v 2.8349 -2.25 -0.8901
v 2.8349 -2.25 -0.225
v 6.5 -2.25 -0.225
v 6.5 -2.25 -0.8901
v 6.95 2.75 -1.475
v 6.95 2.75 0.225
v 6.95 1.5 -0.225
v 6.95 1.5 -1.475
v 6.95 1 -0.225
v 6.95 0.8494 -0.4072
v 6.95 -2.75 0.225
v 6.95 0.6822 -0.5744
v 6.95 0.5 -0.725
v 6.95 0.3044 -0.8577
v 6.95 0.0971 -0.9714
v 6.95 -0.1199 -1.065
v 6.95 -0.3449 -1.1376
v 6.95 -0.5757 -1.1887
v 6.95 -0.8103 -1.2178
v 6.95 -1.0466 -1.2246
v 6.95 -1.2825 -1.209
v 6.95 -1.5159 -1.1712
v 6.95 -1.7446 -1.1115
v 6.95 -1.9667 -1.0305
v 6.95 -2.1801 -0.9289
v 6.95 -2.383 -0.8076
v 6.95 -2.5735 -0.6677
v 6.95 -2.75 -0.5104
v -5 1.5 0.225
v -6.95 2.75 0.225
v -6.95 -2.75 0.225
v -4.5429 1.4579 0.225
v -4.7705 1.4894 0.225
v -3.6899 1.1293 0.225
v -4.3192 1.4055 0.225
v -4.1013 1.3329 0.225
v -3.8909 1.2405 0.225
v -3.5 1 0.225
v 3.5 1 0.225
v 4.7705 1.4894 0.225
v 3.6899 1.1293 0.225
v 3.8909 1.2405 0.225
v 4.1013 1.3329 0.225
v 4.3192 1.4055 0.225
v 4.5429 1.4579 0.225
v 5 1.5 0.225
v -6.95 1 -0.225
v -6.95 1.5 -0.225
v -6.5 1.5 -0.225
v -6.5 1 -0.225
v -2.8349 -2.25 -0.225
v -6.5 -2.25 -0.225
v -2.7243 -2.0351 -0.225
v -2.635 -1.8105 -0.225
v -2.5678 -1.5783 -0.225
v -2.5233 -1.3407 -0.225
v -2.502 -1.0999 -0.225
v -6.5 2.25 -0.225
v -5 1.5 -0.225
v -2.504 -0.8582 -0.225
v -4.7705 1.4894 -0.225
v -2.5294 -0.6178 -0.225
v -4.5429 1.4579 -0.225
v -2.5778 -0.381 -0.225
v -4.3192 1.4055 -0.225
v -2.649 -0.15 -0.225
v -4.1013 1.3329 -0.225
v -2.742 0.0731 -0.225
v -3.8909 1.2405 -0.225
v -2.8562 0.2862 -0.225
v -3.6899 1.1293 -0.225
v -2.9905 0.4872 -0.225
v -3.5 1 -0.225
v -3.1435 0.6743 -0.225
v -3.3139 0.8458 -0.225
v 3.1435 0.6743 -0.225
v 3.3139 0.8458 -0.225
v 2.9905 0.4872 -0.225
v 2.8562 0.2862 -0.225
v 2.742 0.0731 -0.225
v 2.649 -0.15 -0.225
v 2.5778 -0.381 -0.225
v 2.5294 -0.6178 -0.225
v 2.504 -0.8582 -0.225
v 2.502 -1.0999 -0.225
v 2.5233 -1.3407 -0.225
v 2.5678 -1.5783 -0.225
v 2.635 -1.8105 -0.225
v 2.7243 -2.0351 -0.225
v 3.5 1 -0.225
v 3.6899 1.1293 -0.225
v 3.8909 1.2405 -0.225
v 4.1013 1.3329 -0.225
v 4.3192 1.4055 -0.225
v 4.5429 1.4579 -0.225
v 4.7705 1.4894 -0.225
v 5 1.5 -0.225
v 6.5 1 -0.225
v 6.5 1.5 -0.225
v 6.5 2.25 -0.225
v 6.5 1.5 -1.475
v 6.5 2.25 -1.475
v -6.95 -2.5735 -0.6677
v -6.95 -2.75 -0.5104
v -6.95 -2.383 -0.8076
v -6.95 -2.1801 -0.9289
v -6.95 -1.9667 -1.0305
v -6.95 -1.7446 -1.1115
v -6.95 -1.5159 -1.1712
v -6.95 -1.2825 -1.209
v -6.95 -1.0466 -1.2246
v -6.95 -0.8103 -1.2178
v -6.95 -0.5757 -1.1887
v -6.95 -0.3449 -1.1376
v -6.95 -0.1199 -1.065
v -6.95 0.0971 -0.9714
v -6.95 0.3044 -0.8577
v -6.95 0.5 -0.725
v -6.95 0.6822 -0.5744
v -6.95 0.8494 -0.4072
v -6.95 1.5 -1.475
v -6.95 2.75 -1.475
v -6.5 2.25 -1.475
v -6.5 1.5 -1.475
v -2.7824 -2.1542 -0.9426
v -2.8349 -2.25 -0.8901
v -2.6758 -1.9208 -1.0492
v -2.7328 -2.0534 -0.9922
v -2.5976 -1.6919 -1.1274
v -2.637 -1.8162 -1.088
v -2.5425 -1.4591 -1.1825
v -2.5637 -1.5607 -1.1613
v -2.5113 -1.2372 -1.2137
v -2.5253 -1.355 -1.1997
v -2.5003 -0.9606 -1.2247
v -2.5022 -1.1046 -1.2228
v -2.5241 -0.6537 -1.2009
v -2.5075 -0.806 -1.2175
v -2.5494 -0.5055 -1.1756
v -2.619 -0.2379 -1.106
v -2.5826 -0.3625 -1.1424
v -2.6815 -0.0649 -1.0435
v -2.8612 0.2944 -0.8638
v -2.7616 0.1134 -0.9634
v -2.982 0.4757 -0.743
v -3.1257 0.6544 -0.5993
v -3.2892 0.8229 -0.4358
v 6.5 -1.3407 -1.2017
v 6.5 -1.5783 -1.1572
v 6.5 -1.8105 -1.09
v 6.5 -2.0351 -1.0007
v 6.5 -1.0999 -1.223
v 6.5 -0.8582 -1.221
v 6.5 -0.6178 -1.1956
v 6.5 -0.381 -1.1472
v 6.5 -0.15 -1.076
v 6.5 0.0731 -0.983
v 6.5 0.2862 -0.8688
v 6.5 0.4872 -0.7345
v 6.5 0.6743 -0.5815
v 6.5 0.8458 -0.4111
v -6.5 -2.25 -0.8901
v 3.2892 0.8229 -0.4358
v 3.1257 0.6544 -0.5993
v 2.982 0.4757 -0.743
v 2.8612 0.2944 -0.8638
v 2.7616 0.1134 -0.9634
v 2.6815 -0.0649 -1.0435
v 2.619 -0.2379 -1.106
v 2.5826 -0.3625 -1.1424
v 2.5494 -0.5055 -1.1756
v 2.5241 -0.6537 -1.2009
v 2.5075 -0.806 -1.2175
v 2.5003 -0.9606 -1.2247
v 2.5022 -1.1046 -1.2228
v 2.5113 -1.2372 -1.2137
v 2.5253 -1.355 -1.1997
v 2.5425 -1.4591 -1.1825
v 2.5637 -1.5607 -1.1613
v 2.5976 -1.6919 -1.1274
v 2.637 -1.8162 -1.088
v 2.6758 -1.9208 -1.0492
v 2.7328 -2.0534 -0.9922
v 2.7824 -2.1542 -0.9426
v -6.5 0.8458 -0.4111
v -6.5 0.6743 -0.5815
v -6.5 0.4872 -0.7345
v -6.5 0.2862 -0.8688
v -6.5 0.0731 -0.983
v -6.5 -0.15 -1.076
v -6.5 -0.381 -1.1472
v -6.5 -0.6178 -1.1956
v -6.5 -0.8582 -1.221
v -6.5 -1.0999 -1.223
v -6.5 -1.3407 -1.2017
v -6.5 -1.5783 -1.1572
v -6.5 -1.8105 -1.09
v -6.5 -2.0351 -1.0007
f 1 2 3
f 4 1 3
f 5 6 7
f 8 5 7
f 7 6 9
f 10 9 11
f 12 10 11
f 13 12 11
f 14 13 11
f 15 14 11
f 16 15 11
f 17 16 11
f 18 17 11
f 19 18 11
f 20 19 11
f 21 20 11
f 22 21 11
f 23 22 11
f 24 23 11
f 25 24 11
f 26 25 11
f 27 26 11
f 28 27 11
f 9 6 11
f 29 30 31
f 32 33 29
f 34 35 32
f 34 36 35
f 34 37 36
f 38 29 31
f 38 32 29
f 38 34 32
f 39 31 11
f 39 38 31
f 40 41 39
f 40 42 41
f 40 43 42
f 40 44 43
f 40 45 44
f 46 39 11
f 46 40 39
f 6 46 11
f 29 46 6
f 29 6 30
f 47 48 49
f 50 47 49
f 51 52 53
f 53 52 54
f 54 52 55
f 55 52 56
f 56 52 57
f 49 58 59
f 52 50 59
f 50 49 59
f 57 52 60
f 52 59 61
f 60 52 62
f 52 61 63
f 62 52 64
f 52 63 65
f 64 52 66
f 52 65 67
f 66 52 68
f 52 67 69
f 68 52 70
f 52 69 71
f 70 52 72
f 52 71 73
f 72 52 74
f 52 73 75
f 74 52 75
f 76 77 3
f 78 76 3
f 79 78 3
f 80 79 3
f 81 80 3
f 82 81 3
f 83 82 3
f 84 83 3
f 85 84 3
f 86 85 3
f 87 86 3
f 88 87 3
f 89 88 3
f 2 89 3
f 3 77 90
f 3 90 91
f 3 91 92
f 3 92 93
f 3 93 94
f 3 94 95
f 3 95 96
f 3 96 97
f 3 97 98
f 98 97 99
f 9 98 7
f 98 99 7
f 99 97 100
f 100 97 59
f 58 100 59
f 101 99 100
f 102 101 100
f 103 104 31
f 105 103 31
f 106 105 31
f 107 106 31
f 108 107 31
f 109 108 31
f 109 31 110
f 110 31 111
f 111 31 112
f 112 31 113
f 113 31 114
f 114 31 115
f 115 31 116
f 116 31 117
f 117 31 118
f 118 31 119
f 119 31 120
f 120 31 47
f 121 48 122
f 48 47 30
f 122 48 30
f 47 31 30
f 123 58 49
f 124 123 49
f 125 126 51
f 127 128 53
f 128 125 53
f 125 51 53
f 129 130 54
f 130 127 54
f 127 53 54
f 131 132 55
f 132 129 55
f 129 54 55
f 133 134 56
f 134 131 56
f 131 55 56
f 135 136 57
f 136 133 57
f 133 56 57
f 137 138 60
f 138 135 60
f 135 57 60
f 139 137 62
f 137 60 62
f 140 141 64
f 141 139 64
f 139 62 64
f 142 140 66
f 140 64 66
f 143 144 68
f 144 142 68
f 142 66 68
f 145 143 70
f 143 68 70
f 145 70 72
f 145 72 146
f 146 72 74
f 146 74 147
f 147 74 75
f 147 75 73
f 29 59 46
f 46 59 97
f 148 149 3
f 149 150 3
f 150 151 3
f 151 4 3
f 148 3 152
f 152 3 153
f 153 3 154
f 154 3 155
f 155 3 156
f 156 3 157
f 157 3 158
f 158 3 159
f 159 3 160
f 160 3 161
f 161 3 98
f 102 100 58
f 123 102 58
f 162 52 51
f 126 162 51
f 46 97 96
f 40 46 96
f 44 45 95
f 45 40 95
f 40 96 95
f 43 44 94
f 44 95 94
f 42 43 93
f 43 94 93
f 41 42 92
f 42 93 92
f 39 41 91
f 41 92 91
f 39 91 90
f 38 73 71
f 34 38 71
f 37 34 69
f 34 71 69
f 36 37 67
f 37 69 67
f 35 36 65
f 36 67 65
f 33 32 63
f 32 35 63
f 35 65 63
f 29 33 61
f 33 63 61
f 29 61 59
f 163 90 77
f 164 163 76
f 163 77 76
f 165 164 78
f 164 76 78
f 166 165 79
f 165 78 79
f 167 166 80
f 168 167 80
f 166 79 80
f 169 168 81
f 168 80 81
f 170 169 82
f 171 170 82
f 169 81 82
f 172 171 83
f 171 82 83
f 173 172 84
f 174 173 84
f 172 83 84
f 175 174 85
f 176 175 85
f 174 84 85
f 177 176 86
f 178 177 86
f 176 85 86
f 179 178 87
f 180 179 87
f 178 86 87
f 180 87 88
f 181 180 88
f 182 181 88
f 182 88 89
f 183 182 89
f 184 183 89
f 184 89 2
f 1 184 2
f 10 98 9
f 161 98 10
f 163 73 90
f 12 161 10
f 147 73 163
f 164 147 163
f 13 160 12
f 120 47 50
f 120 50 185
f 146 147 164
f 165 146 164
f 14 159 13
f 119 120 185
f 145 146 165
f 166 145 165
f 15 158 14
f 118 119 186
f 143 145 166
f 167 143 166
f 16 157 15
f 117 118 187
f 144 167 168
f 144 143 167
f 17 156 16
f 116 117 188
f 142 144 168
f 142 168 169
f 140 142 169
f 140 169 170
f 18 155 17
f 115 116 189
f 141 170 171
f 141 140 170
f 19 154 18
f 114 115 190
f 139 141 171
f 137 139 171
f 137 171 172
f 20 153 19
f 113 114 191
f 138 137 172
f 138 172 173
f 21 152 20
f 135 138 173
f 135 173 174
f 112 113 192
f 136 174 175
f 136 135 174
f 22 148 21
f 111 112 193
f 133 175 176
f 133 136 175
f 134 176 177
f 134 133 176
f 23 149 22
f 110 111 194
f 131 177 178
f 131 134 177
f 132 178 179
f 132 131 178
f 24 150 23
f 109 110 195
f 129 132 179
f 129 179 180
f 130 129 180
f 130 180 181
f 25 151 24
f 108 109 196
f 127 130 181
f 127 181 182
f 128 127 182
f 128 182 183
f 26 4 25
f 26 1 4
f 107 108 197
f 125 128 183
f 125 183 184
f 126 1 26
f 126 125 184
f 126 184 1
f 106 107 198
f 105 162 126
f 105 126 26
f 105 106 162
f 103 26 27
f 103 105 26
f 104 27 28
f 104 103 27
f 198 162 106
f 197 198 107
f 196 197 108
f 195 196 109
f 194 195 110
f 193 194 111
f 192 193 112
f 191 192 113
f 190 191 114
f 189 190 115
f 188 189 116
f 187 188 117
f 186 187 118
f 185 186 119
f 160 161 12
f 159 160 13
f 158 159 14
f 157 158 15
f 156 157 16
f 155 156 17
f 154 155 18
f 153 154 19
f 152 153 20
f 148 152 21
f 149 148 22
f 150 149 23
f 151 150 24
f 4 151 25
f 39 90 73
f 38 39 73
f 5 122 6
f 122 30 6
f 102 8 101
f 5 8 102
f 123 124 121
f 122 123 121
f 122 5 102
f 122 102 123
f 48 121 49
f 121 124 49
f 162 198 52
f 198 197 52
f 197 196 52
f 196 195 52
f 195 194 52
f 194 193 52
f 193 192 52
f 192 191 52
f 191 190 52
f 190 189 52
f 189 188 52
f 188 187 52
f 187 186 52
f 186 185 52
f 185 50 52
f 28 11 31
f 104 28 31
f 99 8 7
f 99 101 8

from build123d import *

# Parameters (mm, degrees)
SKETCH1_W               = 13
SKETCH1_H               = 4.5
BOSS_EXTRUDE1_DEPTH     = 0.225
BOSS_EXTRUDE2_DEPTH     = 1.25
BOSS_EXTRUDE3_DEPTH     = 2
SKETCH4_W               = 7
SKETCH4_H               = 0.5
CUT_EXTRUDE1_DEPTH      = 3.45
CUT_EXTRUDE2_DEPTH      = 7.95
CUT_EXTRUDE2_DEPTH_BACK = 7.95


with BuildPart() as part:
    # Sketch1 → Boss-Extrude1 (new body, symmetric)
    with BuildSketch(Plane.XY):
        Polygon((6.95, 2.25), (6.95, 2.75), (6.5, 2.75), (-6.5, 2.75), (-6.95, 2.75), (-6.95, 2.25), (-6.95, -2.25), (-6.95, -2.75), (-6.5, -2.75), (6.5, -2.75), (6.95, -2.75), (6.95, -2.25), align=None)
        Rectangle(SKETCH1_W, SKETCH1_H, mode=Mode.SUBTRACT)
        with BuildLine():
            Line((6.5, 1.875), (6.5, 2.25))
            Line((6.5, 2.25), (-6.5, 2.25))
            Line((-6.5, 2.25), (-6.5, 1.875))
            Line((-6.5, 1.875), (-6.5, 1))
            Line((-6.5, 1), (-6.5, -2.25))
            Line((-6.5, -2.25), (-2.834936491, -2.25))
            ThreePointArc((-2.834936491, -2.25), (-2.834936491, 0.25), (-5, 1.5))
            Line((-5, 1.5), (5, 1.5))
            ThreePointArc((5, 1.5), (2.834936491, 0.25), (2.834936491, -2.25))
            Line((2.834936491, -2.25), (6.5, -2.25))
            Line((6.5, -2.25), (6.5, 1))
            Line((6.5, 1), (6.5, 1.875))
        make_face()
        with BuildLine():
            Line((-2.834936491, -2.25), (2.834936491, -2.25))
            ThreePointArc((2.834936491, -2.25), (2.834936491, 0.25), (5, 1.5))
            Line((5, 1.5), (-5, 1.5))
            ThreePointArc((-5, 1.5), (-2.834936491, 0.25), (-2.834936491, -2.25))
        make_face()
    extrude(amount=BOSS_EXTRUDE1_DEPTH, both=True)

    # Sketch2 → Boss-Extrude2 (add)
    with BuildSketch(Plane(origin=(0, 0, -0.225), x_dir=(-1, 0, 0), z_dir=(0, 0, -1))):
        Polygon((-6.95, 2.25), (-6.95, -2.25), (-6.95, -2.75), (-6.5, -2.75), (6.5, -2.75), (6.95, -2.75), (6.95, -2.25), (6.95, 2.25), (6.95, 2.75), (6.5, 2.75), (-6.5, 2.75), (-6.95, 2.75), align=None)
        Polygon((-6.5, 1), (-6.5, 1.875), (-6.5, 2.25), (6.5, 2.25), (6.5, 1.875), (6.5, 1), (6.5, -2.25), (2.834936491, -2.25), (-2.834936491, -2.25), (-6.5, -2.25), align=None, mode=Mode.SUBTRACT)
    extrude(amount=BOSS_EXTRUDE2_DEPTH)

    # Sketch3 → Boss-Extrude3 (add)
    with BuildSketch(Plane(origin=(0, 0, -0.225), x_dir=(-1, 0, 0), z_dir=(0, 0, -1))):
        with BuildLine():
            ThreePointArc((-5, 1.5), (-2.834936491, 0.25), (-2.834936491, -2.25))
            Line((-2.834936491, -2.25), (2.834936491, -2.25))
            ThreePointArc((2.834936491, -2.25), (2.834936491, 0.25), (5, 1.5))
            Line((5, 1.5), (-5, 1.5))
        make_face()
    extrude(amount=BOSS_EXTRUDE3_DEPTH)

    # Sketch4 → Cut-Extrude1 (cut, through all)
    with BuildSketch(Plane(origin=(0, 0, -2.225), x_dir=(-1, 0, 0), z_dir=(0, 0, -1))):
        with Locations((0, 1.25)):
            Rectangle(SKETCH4_W, SKETCH4_H)
        with BuildLine():
            Line((3.5, 1.5), (3.5, 1))
            ThreePointArc((3.5, 1), (4.209430585, 1.371708245), (5, 1.5))
            Line((5, 1.5), (3.5, 1.5))
        make_face()
        with BuildLine():
            ThreePointArc((-5, 1.5), (-4.209430585, 1.371708245), (-3.5, 1))
            Line((-3.5, 1), (-3.5, 1.5))
            Line((-3.5, 1.5), (-5, 1.5))
        make_face()
    extrude(amount=-CUT_EXTRUDE1_DEPTH, mode=Mode.SUBTRACT)

    # Sketch5 → Cut-Extrude2 (cut, two sides)
    with BuildSketch(Plane(origin=(0, 0, 0), x_dir=(0, 0, -1), z_dir=(1, 0, 0))) as cut_extrude2_sk:
        with BuildLine():
            Line((3.725, 1.5), (0.225, 1.5))
            Line((0.225, 1.5), (0.225, 1))
            ThreePointArc((0.225, 1), (1.096708245, -1.790569415), (-1.275, -3.5))
            Line((-1.275, -3.5), (3.725, -3.5))
            Line((3.725, -3.5), (3.725, 1.5))
        make_face()
    extrude(amount=CUT_EXTRUDE2_DEPTH, mode=Mode.SUBTRACT)
    extrude(cut_extrude2_sk.sketch, amount=-CUT_EXTRUDE2_DEPTH_BACK, mode=Mode.SUBTRACT)


solid = part.part
